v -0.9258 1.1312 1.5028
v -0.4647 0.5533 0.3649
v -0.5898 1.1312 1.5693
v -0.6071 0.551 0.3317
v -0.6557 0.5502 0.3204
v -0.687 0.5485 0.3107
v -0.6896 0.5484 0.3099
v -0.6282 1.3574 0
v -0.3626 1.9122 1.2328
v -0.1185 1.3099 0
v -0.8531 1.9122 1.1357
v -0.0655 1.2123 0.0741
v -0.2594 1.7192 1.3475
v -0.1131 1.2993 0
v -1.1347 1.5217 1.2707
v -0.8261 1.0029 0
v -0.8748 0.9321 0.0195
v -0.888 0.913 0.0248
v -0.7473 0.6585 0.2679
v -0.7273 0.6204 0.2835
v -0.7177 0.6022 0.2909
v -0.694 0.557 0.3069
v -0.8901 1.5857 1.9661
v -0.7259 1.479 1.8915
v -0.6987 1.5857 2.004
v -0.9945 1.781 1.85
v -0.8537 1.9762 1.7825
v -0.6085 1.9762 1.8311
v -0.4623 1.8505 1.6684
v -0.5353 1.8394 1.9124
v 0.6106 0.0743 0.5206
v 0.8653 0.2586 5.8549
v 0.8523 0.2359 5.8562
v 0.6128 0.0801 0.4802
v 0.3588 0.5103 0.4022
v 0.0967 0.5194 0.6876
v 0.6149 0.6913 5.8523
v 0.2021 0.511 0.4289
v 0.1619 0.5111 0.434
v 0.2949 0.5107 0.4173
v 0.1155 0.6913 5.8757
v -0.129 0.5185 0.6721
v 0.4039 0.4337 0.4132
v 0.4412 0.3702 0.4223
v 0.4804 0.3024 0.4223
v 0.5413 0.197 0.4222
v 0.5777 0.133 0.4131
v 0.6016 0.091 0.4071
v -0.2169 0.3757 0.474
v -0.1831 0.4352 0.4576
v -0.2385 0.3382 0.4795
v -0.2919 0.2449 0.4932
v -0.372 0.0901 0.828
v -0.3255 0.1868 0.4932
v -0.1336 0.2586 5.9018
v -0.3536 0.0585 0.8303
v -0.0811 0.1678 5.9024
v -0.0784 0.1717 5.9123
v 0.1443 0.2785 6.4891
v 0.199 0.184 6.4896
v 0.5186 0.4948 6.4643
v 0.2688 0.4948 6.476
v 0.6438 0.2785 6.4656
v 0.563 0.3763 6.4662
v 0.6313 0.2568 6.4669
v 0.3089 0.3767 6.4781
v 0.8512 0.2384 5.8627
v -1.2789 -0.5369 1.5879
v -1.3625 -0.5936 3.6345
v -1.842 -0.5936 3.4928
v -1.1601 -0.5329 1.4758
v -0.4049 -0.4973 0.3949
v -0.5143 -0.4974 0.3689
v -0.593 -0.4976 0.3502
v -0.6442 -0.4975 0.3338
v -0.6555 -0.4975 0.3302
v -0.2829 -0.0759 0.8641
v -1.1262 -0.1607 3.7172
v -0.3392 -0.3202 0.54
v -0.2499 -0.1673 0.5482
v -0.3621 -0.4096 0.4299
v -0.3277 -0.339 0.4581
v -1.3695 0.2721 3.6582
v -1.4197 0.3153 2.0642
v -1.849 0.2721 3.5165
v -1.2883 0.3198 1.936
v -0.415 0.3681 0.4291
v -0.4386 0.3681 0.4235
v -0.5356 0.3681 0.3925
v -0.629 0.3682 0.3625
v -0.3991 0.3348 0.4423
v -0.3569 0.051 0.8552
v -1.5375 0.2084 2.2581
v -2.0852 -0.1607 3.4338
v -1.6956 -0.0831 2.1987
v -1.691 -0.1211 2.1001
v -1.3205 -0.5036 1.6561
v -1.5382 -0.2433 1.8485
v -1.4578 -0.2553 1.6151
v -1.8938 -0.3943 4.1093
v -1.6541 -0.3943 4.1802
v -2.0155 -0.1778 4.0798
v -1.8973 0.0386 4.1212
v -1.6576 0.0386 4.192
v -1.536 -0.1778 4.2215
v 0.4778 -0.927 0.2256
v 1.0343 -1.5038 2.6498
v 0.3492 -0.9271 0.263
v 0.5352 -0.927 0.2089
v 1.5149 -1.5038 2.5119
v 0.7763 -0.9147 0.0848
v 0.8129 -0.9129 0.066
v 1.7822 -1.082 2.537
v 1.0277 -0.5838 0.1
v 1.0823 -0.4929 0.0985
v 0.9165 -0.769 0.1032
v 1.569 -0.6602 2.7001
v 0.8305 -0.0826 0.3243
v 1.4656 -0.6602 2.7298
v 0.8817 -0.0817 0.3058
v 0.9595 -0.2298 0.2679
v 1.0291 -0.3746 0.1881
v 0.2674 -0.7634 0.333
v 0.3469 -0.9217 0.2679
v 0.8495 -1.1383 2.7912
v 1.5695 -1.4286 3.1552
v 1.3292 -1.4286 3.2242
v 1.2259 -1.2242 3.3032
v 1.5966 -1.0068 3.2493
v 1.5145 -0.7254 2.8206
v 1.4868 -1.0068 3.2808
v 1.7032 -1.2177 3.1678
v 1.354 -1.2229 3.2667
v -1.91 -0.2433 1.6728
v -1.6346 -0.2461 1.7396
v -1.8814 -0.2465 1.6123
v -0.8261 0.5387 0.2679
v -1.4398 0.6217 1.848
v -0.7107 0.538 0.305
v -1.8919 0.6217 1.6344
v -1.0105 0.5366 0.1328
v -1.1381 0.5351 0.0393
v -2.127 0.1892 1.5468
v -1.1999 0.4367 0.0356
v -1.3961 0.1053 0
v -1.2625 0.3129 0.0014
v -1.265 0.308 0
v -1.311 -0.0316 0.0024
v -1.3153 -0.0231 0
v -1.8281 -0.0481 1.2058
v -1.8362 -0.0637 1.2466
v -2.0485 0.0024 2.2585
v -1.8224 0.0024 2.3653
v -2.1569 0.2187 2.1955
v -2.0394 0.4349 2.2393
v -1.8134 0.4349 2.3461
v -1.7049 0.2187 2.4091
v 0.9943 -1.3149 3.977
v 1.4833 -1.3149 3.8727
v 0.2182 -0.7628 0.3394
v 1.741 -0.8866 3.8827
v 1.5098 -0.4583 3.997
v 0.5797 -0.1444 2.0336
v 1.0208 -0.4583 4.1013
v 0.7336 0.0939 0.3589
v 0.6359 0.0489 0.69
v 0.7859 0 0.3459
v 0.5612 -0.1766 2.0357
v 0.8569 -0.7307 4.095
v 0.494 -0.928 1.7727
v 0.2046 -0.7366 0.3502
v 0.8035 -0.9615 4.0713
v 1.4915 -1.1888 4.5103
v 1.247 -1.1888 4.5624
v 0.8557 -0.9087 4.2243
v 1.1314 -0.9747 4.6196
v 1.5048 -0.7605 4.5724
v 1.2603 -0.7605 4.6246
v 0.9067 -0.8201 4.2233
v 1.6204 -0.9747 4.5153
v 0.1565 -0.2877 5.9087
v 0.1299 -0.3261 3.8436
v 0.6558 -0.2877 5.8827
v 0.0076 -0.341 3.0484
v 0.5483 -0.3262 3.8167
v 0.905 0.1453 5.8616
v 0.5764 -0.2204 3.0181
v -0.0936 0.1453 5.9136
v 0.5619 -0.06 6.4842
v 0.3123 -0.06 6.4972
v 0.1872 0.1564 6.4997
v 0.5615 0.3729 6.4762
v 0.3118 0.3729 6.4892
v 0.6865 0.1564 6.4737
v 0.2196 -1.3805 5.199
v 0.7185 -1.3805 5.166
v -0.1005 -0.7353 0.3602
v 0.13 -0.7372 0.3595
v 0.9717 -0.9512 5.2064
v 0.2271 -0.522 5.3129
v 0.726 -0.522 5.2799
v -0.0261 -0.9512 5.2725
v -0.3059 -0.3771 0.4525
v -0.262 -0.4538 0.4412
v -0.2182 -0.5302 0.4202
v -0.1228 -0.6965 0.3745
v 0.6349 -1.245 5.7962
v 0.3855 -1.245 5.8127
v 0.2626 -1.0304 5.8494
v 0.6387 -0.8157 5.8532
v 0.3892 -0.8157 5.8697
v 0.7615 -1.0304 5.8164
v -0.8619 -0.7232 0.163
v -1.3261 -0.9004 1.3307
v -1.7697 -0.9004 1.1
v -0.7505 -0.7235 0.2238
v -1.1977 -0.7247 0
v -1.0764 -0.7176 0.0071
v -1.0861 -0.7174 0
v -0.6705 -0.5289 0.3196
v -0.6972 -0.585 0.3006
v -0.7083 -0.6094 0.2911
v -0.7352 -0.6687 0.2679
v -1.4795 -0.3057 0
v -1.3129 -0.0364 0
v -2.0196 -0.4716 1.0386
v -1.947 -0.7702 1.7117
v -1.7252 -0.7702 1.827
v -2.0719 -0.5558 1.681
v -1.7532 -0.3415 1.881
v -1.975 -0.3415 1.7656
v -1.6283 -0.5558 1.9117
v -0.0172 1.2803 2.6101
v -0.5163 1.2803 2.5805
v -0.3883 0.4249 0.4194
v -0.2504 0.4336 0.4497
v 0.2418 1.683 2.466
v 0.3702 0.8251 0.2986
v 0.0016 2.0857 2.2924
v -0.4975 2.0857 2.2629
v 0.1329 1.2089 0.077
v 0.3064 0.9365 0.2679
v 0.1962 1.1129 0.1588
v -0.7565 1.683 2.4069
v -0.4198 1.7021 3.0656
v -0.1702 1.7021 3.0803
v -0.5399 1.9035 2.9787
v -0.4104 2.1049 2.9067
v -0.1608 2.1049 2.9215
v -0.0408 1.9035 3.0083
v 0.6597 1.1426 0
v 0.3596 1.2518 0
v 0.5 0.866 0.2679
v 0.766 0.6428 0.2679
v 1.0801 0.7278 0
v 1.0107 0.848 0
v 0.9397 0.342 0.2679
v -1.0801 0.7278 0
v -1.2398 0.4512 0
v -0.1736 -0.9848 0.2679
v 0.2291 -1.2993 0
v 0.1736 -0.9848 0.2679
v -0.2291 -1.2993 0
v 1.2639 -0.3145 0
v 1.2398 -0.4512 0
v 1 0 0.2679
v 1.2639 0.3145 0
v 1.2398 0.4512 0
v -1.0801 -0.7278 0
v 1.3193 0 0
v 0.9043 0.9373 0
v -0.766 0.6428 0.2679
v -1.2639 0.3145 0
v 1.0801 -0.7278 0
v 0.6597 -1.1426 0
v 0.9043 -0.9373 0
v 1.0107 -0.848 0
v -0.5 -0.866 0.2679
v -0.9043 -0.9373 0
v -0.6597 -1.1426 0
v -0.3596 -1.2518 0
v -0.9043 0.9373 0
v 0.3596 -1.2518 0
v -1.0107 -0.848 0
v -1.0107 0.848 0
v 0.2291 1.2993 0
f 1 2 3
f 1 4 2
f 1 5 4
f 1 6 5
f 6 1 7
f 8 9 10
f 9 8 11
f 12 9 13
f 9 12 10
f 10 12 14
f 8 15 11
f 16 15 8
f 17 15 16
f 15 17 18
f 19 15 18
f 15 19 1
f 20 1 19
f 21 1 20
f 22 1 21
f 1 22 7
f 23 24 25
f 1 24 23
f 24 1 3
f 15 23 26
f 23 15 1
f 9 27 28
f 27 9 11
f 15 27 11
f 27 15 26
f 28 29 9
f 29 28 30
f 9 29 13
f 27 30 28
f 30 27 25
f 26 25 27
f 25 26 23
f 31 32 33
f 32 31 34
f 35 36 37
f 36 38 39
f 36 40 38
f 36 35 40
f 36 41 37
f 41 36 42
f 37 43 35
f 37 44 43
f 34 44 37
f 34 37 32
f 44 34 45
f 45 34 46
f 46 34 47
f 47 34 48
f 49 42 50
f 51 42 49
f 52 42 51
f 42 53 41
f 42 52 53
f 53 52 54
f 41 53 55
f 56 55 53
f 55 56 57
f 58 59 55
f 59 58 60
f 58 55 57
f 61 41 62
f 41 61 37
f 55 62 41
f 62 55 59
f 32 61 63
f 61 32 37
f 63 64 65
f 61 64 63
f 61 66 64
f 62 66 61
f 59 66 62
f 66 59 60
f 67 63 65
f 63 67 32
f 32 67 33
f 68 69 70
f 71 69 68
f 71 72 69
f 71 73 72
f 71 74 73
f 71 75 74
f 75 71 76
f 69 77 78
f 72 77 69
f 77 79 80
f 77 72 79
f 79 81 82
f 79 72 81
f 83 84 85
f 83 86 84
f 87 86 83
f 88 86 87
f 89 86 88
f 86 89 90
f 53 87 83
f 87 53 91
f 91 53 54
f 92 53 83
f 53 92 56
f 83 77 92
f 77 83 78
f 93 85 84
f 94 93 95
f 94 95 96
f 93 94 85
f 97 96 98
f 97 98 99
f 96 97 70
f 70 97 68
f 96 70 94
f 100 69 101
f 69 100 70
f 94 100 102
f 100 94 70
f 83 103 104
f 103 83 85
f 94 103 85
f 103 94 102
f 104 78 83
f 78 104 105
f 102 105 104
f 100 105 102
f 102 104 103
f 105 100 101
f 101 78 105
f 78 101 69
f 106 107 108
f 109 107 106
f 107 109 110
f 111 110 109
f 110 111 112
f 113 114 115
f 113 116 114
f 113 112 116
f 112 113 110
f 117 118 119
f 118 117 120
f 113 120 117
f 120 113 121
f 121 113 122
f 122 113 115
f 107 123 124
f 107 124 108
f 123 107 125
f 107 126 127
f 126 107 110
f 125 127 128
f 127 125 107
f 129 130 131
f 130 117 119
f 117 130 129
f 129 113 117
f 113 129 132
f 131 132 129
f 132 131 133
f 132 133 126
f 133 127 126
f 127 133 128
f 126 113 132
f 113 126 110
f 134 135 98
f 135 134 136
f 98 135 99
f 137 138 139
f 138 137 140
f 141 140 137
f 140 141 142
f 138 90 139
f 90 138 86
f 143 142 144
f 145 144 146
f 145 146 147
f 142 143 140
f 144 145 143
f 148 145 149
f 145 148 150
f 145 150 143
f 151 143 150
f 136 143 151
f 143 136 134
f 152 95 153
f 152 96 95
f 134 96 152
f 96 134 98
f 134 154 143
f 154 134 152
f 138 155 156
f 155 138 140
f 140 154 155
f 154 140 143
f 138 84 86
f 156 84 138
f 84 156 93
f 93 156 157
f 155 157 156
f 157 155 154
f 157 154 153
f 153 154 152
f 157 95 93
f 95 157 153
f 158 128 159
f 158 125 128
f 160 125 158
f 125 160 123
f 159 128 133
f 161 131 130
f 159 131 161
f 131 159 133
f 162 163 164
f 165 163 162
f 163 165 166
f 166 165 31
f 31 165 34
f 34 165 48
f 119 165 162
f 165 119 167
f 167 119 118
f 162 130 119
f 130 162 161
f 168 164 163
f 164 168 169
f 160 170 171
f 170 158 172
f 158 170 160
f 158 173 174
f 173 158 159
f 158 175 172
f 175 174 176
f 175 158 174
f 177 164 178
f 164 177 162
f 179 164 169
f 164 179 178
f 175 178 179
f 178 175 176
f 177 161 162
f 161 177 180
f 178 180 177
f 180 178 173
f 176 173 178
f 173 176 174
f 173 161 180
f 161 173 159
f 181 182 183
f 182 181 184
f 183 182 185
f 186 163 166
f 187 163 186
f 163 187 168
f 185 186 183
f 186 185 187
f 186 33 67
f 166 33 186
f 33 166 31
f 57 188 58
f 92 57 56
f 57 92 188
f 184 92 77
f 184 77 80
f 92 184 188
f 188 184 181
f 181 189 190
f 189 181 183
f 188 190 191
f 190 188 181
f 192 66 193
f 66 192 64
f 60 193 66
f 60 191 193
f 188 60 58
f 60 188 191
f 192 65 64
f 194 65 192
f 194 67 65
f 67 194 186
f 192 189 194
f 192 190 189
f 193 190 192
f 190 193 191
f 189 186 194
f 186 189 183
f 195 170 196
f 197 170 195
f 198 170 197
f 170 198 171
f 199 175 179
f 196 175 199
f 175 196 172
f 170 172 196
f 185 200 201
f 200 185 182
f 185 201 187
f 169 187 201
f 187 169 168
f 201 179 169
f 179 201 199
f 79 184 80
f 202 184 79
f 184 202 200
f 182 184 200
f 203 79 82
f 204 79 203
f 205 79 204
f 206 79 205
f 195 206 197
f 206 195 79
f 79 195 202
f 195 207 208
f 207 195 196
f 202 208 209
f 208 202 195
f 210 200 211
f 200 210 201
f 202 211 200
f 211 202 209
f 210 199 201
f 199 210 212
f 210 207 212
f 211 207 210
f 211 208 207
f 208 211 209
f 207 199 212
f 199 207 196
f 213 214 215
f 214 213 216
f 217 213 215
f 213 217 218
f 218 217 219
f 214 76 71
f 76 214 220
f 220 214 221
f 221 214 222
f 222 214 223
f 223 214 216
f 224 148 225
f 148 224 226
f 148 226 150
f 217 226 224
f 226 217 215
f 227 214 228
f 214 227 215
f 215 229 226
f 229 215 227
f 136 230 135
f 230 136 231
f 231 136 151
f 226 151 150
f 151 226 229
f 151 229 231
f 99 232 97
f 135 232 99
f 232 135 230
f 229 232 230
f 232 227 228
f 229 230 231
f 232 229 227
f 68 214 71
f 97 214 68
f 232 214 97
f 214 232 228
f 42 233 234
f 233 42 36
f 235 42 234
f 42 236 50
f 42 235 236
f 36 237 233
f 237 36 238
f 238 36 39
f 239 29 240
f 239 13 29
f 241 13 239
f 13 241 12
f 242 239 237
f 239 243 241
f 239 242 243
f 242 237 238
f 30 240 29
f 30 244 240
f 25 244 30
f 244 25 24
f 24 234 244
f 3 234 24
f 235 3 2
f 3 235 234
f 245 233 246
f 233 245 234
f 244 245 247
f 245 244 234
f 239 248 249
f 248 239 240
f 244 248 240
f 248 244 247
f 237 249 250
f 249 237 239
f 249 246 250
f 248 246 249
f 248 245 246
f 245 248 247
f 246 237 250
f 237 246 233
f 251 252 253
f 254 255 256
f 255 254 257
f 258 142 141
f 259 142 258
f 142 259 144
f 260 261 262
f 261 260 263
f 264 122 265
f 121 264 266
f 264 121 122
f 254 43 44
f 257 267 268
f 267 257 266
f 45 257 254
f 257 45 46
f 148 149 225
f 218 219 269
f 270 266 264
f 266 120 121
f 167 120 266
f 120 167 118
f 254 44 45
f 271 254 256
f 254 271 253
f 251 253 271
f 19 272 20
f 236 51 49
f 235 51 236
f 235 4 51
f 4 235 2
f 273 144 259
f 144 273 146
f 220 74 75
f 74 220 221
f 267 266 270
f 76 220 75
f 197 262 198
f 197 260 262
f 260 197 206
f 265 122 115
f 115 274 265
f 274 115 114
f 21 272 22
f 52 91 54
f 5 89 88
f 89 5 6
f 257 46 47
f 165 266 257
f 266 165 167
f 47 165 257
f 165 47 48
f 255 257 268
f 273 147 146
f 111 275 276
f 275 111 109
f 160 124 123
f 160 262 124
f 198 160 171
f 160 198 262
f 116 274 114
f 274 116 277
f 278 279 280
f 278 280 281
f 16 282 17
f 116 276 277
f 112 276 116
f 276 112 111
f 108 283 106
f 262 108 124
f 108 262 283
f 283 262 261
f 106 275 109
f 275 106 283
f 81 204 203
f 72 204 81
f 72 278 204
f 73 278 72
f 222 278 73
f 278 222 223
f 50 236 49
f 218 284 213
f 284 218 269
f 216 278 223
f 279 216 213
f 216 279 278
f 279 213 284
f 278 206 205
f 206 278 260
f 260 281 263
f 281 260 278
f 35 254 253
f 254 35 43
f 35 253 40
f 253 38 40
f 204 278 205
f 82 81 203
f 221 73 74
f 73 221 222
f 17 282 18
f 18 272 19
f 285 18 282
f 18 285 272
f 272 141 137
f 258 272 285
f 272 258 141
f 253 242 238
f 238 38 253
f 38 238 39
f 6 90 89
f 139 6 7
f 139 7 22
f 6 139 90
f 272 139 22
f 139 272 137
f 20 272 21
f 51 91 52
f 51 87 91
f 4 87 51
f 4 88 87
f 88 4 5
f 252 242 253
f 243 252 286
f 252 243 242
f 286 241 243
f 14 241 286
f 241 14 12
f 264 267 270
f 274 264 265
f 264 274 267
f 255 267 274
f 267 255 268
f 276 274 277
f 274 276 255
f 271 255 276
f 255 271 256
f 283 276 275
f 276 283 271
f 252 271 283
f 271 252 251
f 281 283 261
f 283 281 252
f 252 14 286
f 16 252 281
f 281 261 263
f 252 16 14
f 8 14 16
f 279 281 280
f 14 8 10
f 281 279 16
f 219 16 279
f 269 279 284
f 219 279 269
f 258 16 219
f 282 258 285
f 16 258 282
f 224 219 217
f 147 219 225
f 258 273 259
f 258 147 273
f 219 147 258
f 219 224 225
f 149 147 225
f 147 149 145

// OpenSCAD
//A way to save your "random" arrangement
seed=74;				
//Number of crystals
num=10;							
//Width of crystals
wide=1;
//Height of each crystal
high=6;
//Number of sides on each crystal
side=6;
//Lower numbers will have shorter outer crystals
dropoff=.8;
//Overhang angle of the outermost crystals
bouquet_angle=30;
//The density of the crystals
density=10;
R_max=wide*num/density;
angle=rands(0,360*10,num+1,seed);
rad=rands(0,R_max,num+1,seed);
hyp=R_max/sin(bouquet_angle);
adj=R_max*cos(bouquet_angle)/sin(bouquet_angle);
difference(){
	union(){
	translate([0,0,-2*adj+hyp]) 
		sphere(hyp,$fn=3*side);
	for(i=[1:num]){
		translate([rad[i]*cos(angle[i]),rad[i]*sin(angle[i]),0]) 
			rotate([-bouquet_angle*sin(angle[i])*rad[i]/R_max,bouquet_angle*cos(angle[i])*rad[i]/R_max,0])
				crystal(side,high*exp(-pow((rad[i]/(dropoff*R_max)),2)),wide/2,(high)/10);
		}
	}
	translate([0,0,-hyp]) 
		cube(2*hyp,true);
	}

module crystal(sides, height, width, taper_height){
	cylinder(height,width,width,$fn=sides);
	translate([0,0,height]) 
		cylinder(taper_height,width,width/2,$fn=sides);
	}
